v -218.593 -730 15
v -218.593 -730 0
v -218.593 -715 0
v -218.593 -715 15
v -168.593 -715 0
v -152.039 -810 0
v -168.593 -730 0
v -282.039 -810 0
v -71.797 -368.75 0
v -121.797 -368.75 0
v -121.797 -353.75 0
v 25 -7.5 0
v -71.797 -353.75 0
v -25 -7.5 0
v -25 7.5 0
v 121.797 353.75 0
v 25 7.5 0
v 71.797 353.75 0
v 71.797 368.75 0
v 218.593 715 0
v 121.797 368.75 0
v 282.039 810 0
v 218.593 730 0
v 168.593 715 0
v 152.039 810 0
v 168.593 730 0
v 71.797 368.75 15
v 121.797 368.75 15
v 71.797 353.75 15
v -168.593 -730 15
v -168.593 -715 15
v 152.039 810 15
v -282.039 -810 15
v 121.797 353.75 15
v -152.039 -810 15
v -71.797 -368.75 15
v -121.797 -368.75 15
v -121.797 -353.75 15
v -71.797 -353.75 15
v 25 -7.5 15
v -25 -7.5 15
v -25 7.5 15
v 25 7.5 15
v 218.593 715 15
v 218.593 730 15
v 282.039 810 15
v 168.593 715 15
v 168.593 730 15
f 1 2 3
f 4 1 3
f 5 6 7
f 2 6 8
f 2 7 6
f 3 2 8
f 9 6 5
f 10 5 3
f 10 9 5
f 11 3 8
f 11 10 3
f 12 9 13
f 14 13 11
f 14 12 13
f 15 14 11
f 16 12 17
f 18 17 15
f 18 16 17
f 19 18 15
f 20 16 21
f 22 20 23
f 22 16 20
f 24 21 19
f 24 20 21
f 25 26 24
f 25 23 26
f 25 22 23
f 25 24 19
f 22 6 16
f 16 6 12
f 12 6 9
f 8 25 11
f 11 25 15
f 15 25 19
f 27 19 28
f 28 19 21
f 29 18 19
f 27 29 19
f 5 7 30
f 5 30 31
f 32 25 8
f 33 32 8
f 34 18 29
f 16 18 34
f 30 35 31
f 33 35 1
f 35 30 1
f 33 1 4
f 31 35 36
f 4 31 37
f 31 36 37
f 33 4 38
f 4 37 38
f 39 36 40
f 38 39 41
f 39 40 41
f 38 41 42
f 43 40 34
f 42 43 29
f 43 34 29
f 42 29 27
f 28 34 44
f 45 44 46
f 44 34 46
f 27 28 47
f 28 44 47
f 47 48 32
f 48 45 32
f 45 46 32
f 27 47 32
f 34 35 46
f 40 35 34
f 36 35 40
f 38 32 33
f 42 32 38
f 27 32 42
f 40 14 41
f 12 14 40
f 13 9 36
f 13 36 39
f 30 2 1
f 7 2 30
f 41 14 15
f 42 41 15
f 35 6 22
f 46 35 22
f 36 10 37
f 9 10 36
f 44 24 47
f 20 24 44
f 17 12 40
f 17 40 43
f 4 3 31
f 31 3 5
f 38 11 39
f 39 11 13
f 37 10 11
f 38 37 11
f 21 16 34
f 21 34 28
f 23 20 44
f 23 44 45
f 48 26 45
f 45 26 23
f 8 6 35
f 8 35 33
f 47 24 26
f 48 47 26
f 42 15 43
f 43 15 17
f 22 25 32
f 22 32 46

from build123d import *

# Parameters (mm, degrees)
CROQUIS1_W              = 50
CROQUIS1_H              = 15
SALIENTE_EXTRUIR1_DEPTH = 15


with BuildPart() as part:
    # Croquis1 → Saliente-Extruir1 (new body)
    with BuildSketch(Plane.XY):
        Polygon((273.330497115, 777.5), (-152.038845869, -810), (-282.038845869, -810), (-273.330497115, -777.5), (152.038845869, 810), (282.038845869, 810), align=None)
        Rectangle(CROQUIS1_W, CROQUIS1_H, mode=Mode.SUBTRACT)
        with Locations((-193.593291531, -722.5)):
            Rectangle(CROQUIS1_W, CROQUIS1_H, mode=Mode.SUBTRACT)
        with Locations((-96.796645766, -361.25)):
            Rectangle(CROQUIS1_W, CROQUIS1_H, mode=Mode.SUBTRACT)
        with Locations((96.796645766, 361.25)):
            Rectangle(CROQUIS1_W, CROQUIS1_H, mode=Mode.SUBTRACT)
        with Locations((193.593291531, 722.5)):
            Rectangle(CROQUIS1_W, CROQUIS1_H, mode=Mode.SUBTRACT)
    extrude(amount=SALIENTE_EXTRUIR1_DEPTH)


solid = part.part
